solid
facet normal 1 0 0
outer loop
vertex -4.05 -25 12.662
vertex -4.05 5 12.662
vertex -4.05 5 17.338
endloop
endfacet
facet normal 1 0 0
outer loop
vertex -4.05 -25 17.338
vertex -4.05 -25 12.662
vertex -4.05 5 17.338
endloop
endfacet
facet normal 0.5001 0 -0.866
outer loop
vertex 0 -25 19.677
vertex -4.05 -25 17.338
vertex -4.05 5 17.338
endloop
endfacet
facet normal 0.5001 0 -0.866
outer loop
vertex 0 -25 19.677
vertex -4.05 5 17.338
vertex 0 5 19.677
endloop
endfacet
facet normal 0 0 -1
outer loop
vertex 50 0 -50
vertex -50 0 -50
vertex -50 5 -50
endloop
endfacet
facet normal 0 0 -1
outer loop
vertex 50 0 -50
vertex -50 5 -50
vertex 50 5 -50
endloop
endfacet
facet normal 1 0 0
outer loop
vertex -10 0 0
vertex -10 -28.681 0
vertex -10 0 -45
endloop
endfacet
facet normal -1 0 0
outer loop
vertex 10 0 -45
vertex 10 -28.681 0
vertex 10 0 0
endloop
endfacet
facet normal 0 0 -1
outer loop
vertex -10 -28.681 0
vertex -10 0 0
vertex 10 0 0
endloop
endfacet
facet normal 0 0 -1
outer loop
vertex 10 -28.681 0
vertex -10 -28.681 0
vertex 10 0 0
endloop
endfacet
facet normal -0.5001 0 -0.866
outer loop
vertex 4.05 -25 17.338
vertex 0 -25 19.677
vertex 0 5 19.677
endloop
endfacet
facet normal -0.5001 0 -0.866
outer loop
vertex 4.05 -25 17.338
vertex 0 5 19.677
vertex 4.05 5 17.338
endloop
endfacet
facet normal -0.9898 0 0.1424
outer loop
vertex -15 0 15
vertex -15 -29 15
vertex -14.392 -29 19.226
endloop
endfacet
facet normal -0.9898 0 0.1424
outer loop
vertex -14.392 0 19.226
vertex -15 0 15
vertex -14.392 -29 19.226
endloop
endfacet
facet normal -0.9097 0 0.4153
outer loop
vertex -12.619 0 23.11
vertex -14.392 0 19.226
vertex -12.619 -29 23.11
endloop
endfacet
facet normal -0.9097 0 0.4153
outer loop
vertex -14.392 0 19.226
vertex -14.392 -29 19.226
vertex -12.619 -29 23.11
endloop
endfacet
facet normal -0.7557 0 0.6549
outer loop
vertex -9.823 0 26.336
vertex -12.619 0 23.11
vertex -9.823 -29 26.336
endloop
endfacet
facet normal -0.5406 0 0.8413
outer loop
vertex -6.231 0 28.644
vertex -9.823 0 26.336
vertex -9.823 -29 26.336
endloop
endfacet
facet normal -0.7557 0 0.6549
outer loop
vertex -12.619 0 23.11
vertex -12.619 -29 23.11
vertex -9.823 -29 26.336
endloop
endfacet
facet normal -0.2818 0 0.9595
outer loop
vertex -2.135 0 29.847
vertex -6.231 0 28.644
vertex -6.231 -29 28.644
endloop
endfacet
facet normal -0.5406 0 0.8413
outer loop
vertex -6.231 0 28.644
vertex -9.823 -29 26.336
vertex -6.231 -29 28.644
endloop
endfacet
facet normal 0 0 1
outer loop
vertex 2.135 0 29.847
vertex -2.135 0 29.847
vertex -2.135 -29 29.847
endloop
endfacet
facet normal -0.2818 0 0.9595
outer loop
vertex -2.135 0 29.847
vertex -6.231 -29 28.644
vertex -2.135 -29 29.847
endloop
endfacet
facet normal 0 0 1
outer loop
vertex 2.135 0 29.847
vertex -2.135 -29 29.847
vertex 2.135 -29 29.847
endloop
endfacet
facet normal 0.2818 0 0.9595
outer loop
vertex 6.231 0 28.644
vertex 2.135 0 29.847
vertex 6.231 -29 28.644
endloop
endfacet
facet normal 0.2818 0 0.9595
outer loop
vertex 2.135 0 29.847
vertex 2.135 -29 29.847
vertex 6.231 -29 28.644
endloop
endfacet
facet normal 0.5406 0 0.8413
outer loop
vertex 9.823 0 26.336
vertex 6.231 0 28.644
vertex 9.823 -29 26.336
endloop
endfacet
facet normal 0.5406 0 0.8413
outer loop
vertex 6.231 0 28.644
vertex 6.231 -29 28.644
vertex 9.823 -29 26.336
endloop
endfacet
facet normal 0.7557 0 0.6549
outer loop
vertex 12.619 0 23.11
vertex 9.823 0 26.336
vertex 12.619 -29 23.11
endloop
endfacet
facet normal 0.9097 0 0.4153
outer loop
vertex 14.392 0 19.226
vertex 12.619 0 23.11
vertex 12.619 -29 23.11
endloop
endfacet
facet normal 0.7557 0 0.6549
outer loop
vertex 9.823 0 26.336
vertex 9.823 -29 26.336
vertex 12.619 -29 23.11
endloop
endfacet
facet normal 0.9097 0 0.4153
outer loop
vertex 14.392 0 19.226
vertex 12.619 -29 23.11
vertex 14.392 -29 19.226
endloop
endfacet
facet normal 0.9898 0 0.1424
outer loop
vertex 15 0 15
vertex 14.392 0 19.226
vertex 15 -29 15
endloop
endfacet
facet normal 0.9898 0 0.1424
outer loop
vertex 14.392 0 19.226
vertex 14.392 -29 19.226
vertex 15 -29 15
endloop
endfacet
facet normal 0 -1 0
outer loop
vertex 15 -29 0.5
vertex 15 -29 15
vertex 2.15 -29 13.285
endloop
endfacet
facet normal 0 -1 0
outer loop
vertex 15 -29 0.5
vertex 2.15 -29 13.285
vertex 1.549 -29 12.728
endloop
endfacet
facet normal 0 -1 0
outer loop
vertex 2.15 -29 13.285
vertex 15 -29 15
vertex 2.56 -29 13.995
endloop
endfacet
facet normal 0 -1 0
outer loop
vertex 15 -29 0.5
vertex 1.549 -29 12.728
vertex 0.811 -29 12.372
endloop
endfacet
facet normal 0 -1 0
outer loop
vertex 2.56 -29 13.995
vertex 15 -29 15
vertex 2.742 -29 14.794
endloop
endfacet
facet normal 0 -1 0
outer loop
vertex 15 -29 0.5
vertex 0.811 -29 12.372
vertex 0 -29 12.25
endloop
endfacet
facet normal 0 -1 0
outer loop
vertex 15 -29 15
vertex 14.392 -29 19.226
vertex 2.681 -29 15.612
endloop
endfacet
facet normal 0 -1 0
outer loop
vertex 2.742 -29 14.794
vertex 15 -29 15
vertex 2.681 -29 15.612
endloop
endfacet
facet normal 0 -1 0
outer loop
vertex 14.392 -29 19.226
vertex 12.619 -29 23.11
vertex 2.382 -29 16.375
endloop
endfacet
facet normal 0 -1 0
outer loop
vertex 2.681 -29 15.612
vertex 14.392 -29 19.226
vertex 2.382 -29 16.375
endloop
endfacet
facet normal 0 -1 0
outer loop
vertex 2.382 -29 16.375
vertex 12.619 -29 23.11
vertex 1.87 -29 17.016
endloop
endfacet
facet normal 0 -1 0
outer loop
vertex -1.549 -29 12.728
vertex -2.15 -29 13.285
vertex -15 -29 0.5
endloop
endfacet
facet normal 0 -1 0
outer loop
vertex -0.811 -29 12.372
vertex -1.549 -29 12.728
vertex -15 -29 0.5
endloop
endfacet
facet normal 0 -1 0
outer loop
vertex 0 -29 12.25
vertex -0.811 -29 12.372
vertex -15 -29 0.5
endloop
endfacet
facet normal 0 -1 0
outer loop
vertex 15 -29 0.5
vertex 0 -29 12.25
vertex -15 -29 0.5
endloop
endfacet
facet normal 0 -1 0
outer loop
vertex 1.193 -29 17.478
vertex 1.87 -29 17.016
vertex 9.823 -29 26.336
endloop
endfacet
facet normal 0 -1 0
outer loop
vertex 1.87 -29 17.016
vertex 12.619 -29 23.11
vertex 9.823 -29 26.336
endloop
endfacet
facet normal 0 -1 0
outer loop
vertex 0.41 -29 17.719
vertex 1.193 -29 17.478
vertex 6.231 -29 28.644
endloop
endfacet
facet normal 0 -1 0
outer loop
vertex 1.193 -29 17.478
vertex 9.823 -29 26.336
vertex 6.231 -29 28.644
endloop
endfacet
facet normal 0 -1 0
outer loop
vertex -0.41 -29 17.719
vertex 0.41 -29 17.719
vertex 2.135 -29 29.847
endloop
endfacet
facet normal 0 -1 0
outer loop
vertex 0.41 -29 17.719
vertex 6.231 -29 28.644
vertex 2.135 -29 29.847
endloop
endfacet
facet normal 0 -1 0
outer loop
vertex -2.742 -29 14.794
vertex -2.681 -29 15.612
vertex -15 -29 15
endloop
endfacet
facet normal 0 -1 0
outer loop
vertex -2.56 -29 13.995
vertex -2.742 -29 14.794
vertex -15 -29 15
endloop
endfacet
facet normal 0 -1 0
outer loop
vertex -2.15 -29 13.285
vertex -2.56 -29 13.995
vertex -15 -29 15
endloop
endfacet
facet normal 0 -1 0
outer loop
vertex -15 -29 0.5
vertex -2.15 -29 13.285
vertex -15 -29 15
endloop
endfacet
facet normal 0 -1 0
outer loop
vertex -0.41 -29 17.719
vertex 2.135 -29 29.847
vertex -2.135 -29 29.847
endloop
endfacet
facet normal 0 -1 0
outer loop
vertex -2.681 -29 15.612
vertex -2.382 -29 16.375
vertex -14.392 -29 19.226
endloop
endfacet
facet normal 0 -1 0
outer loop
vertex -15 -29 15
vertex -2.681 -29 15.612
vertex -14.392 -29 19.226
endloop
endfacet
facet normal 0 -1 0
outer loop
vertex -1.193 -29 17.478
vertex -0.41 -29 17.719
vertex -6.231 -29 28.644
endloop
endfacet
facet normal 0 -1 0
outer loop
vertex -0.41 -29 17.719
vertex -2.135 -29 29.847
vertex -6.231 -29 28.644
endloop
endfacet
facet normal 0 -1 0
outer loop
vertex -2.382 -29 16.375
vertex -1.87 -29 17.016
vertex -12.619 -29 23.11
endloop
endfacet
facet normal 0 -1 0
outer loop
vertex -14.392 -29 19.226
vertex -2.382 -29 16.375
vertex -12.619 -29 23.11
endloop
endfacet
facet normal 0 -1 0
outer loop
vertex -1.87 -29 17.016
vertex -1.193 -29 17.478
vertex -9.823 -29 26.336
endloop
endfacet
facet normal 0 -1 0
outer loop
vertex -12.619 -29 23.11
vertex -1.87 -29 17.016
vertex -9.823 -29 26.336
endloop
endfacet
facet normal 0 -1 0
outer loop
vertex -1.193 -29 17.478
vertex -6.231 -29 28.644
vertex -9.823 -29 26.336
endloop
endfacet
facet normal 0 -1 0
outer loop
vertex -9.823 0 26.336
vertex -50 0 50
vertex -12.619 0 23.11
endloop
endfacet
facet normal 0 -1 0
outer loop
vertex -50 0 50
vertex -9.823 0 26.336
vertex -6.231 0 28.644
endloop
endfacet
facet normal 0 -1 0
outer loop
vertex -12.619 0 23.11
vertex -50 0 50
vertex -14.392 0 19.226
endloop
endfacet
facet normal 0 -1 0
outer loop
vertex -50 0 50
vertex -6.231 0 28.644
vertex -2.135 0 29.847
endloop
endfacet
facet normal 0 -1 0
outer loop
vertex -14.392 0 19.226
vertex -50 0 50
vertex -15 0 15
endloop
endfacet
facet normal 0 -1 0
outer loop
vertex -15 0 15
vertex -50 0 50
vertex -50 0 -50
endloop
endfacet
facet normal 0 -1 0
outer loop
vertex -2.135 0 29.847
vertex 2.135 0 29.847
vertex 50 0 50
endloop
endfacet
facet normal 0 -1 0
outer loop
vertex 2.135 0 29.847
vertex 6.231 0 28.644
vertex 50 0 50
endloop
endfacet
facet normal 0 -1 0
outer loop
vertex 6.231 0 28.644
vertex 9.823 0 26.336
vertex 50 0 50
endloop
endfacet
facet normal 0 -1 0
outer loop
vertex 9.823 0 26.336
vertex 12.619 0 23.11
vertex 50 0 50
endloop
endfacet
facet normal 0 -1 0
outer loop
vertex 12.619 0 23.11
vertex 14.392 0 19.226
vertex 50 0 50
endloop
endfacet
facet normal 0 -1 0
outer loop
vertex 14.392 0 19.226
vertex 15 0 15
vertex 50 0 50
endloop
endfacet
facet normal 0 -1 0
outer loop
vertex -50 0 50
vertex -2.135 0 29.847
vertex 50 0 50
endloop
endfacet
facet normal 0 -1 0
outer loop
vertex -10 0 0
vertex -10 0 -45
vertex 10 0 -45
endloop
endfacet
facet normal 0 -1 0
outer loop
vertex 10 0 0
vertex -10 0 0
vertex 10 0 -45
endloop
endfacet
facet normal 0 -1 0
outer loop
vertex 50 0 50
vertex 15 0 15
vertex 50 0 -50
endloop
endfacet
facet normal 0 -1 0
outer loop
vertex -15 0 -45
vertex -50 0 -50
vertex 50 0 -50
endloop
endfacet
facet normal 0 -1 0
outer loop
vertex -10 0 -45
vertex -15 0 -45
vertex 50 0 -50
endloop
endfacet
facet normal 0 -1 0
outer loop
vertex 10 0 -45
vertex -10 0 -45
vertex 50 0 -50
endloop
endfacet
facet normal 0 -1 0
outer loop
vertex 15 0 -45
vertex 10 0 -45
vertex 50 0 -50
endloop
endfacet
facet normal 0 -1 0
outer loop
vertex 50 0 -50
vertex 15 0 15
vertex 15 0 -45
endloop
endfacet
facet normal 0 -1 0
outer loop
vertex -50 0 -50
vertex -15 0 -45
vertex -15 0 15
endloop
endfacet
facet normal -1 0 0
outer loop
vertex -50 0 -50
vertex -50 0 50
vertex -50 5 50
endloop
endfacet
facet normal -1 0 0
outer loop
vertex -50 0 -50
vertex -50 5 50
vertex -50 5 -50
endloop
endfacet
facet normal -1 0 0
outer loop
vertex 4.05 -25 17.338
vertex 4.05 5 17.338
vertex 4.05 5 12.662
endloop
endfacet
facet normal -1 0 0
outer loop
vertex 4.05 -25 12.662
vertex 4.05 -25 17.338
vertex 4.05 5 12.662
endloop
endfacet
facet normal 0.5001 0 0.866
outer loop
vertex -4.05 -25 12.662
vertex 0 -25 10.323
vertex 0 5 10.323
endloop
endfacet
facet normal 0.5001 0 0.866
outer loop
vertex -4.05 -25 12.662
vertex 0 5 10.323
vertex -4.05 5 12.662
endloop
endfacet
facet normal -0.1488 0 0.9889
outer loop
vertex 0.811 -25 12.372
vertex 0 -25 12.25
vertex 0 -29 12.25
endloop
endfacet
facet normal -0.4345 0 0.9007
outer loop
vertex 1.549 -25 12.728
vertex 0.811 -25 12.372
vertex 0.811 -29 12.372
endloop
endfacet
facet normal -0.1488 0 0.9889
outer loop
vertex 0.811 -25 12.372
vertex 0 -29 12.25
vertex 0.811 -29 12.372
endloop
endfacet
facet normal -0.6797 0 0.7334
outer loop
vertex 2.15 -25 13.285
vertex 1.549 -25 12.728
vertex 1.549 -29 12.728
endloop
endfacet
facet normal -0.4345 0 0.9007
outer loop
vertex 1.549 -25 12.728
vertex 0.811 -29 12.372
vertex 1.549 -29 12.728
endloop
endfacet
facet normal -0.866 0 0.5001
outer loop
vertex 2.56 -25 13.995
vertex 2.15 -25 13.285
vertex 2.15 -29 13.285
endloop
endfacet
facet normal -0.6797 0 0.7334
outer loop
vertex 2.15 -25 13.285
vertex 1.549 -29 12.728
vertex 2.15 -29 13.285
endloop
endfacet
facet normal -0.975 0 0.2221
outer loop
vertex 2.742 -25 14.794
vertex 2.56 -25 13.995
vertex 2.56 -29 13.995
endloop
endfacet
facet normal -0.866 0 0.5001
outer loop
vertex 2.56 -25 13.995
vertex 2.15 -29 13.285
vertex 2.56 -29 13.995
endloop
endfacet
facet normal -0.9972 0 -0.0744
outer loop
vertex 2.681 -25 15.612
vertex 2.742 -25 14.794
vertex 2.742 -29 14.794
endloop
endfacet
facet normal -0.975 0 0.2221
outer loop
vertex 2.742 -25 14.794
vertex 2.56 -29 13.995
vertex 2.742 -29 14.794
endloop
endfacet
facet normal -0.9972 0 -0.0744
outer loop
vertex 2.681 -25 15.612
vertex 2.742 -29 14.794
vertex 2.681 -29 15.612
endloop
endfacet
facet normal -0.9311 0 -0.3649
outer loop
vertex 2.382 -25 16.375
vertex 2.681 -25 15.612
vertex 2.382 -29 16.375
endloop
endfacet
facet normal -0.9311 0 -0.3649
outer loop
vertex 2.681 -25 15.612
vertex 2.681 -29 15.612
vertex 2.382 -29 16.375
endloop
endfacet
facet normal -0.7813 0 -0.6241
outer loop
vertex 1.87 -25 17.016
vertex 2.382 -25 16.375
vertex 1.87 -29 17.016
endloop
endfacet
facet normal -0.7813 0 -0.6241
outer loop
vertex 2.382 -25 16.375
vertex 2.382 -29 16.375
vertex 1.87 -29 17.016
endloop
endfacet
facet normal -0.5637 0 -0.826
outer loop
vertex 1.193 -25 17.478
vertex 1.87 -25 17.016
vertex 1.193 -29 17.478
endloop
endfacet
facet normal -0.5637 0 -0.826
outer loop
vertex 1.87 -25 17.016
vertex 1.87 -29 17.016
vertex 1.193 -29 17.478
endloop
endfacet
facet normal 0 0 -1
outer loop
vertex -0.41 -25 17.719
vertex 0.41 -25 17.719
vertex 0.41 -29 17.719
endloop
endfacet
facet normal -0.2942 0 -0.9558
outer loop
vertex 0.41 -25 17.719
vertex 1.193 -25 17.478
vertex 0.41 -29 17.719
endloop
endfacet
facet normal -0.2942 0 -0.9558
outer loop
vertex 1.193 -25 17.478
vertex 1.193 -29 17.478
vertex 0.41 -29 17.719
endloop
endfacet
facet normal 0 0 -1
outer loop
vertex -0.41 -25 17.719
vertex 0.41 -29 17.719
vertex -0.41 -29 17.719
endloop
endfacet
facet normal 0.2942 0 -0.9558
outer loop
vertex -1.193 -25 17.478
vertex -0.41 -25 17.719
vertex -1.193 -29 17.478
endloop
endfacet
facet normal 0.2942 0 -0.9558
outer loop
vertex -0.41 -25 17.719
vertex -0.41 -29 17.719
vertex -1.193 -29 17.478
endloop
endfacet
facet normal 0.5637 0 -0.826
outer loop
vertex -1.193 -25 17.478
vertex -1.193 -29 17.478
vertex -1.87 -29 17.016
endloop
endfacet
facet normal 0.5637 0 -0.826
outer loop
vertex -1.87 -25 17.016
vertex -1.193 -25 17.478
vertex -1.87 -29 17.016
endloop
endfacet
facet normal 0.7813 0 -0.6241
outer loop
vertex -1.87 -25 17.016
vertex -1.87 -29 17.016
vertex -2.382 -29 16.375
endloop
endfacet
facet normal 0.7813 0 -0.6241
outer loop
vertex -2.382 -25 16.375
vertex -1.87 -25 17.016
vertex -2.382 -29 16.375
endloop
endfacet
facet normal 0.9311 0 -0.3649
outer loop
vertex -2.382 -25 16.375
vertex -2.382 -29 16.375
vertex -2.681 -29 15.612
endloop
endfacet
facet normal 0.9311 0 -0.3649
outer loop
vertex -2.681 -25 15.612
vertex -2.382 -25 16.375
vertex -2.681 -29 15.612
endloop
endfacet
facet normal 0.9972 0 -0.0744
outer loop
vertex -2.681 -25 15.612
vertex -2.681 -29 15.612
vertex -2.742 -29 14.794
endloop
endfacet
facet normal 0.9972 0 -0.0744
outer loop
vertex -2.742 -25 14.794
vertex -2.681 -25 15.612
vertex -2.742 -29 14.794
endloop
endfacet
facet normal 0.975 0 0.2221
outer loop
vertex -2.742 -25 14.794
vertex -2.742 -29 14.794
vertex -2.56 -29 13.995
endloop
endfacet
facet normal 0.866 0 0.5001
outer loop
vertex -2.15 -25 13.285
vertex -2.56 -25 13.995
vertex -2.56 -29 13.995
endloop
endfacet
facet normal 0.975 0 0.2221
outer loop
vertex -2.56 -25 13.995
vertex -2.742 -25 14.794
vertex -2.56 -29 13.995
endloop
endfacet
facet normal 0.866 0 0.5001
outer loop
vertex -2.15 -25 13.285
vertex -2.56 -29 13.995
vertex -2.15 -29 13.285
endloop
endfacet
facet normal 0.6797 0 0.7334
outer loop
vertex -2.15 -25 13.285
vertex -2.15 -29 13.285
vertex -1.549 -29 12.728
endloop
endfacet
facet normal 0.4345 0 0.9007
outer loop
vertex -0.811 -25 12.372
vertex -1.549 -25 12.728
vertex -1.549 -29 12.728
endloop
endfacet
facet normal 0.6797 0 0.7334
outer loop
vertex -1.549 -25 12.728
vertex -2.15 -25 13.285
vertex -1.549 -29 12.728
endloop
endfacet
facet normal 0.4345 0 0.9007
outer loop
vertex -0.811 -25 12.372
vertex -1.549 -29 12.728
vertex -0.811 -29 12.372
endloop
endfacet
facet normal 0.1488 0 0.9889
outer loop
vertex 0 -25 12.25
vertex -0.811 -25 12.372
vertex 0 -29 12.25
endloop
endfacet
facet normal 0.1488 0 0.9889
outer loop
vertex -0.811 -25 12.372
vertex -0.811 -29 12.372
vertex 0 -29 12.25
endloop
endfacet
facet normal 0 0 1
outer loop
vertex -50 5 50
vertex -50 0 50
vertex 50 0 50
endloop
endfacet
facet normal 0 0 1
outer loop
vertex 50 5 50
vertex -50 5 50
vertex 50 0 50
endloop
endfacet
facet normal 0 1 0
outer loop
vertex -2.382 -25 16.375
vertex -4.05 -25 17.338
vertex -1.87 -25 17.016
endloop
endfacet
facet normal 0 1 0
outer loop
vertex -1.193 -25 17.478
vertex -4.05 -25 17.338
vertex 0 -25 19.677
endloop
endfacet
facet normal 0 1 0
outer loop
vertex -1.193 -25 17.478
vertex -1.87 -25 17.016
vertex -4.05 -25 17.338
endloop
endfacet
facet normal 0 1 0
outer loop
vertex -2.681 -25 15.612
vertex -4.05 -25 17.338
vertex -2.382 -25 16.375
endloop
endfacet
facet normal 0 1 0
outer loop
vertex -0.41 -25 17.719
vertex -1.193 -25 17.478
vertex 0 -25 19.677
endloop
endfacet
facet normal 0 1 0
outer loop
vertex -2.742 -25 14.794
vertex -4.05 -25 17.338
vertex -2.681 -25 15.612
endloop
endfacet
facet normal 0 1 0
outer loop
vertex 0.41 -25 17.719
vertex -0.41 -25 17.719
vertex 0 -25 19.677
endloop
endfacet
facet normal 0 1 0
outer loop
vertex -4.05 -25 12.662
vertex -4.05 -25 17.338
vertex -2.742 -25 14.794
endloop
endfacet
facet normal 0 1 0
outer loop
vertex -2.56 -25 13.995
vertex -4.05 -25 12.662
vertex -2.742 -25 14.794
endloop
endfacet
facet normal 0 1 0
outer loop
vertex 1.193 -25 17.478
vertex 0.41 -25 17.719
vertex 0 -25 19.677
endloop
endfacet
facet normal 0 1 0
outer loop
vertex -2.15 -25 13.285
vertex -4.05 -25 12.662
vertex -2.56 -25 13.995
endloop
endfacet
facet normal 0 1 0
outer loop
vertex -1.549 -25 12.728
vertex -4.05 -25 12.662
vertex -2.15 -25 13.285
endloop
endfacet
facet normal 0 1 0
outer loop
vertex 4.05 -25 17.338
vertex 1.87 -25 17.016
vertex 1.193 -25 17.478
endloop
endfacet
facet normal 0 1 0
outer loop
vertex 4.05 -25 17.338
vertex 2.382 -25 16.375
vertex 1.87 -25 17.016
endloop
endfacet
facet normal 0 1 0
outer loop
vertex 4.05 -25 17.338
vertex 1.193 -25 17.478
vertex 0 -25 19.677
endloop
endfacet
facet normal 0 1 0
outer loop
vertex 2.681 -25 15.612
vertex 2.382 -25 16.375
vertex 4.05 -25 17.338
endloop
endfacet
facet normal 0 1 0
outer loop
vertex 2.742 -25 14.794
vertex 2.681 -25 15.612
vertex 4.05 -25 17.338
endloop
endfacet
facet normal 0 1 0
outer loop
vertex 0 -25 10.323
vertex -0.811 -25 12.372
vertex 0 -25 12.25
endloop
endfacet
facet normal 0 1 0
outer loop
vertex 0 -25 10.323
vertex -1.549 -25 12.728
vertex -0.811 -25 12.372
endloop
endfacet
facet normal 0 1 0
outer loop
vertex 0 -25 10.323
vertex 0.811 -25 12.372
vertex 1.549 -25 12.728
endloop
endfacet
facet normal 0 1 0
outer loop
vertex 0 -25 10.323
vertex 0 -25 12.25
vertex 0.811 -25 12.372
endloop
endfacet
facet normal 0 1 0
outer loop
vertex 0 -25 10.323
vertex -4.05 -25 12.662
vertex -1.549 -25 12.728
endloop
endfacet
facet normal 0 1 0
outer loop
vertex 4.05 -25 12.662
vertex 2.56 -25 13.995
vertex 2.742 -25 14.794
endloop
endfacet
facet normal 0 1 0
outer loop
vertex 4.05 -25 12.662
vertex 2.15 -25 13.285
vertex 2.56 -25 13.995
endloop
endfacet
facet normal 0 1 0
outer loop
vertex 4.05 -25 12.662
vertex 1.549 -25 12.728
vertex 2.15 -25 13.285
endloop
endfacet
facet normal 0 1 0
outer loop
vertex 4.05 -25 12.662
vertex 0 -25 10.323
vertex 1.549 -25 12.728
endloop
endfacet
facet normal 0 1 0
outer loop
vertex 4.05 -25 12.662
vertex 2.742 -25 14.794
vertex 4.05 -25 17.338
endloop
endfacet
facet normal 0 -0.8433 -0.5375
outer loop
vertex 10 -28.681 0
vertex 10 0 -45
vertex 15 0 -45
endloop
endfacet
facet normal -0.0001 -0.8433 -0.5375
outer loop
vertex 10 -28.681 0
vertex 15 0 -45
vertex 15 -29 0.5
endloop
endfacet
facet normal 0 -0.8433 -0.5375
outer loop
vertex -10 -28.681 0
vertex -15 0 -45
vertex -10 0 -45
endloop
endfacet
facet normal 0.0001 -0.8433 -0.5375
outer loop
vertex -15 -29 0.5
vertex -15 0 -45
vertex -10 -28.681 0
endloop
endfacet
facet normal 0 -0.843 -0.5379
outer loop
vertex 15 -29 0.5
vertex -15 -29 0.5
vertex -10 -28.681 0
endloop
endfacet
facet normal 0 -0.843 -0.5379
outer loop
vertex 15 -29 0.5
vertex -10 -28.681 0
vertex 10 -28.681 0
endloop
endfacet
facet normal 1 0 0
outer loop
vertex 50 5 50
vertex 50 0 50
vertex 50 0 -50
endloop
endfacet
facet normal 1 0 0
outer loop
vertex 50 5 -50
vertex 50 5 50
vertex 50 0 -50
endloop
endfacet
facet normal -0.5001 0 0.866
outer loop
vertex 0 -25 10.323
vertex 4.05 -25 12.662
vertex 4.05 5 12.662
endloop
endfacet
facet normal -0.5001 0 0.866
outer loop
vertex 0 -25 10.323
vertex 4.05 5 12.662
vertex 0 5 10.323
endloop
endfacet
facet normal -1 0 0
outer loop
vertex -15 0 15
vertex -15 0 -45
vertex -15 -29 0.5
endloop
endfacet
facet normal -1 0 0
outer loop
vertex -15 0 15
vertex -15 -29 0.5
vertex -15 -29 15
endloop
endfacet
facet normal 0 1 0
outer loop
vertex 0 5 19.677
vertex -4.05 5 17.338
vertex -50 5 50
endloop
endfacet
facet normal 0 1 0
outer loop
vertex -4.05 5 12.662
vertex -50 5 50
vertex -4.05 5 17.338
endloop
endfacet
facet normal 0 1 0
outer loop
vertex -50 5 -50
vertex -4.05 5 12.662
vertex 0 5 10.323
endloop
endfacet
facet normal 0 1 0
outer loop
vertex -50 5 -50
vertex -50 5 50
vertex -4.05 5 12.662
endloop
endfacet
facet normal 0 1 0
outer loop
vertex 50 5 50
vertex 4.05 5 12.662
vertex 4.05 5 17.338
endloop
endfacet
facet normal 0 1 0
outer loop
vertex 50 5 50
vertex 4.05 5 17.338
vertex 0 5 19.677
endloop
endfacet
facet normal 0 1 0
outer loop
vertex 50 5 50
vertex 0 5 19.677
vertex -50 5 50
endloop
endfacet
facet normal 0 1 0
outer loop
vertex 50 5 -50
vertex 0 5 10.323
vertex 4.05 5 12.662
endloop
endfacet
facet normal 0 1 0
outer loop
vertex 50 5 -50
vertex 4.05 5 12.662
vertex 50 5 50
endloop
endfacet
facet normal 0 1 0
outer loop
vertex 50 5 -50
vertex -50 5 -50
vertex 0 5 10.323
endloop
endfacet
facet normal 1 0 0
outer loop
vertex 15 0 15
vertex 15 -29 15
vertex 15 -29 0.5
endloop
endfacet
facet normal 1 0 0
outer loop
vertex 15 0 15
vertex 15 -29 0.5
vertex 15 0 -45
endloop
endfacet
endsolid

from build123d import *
from build123d.topology import SkipClean

# Parameters (mm, degrees)
ESQUISSE1_W             = 100
ESQUISSE1_H             = 100
ESQUISSE1_R             = 2.75
BOSS_EXTRU_1_DEPTH      = 5
BOSS_EXTRU_2_START      = 29
ESQUISSE2_R             = 2.75
BOSS_EXTRU_2_DEPTH      = 29
ESQUISSE3_W             = 30
ESQUISSE3_H             = 43.5
BOSS_EXTRU_3_DEPTH      = 29
CHANFREIN1_SIZE         = 29
CHANFREIN1_SIZE_2       = 45.5
ENL_V_START             = -30
ESQUISSE4_R             = 2.75
ENL_V_MAT_EXTRU_1_DEPTH = 30
ESQUISSE7_W             = 10
ESQUISSE7_H             = 29
ENL_V_MAT_EXTRU_2_DEPTH = 77.426435217


with BuildPart() as part:
    # Esquisse1 → Boss.-Extru.1 (new body)
    with BuildSketch(Plane(origin=(0, 0, 0), x_dir=(1, 0, 0), z_dir=(0, 1, 0))):
        Rectangle(ESQUISSE1_W, ESQUISSE1_H)
        with Locations(Location((0, -15, 0), (0, 0, 270))):
            Circle(ESQUISSE1_R, mode=Mode.SUBTRACT)
    extrude(amount=BOSS_EXTRU_1_DEPTH)

    # Esquisse2 → Boss.-Extru.2 (add)
    with SkipClean():  # the faces are left unmerged after this step: merging them gives an invalid solid
        with BuildSketch(Plane.XZ.offset(BOSS_EXTRU_2_START)):
            with BuildLine():
                ThreePointArc((-15, 15), (0, 30), (15, 15))
                Line((15, 15), (15, -1.5))
                Line((15, -1.5), (-15, -1.5))
                Line((-15, -1.5), (-15, 15))
            make_face()
            with Locations(Location((0, 15, 0), (0, 0, 270))):
                Circle(ESQUISSE2_R, mode=Mode.SUBTRACT)
        extrude(amount=-BOSS_EXTRU_2_DEPTH)

    # Esquisse3 → Boss.-Extru.3 (add)
    with SkipClean():  # the faces are left unmerged after this step: merging them gives an invalid solid
        with BuildSketch(Plane.XZ):
            with Locations((0, -23.25)):
                Rectangle(ESQUISSE3_W, ESQUISSE3_H)
        extrude(amount=BOSS_EXTRU_3_DEPTH)

    # Chanfrein1
    # the kernel refuses this chamfer: 45.5, 29 mm, written as the material it takes off along each edge
    with BuildSketch(Plane(origin=(-132.612350115, -29, -45), x_dir=(0, 0.9986920470194074, -0.051129201247289646), z_dir=(1, 0, 0))) as chanfrein1_piece_1_section:
        Polygon((CHANFREIN1_SIZE * 0.998692047019, CHANFREIN1_SIZE * 0.0511292012473), (-CHANFREIN1_SIZE_2 * 0.0511292012473, CHANFREIN1_SIZE_2 * 0.998692047019), (0, 0), align=None)
    chanfrein1_piece_1 = extrude(amount=265.22470023, mode=Mode.PRIVATE)
    chanfrein1_piece_1 = split(chanfrein1_piece_1, bisect_by=Plane(origin=(0, 0, -29.75832693), z_dir=(0, -1, 0)), keep=Keep.TOP, mode=Mode.PRIVATE)
    add(chanfrein1_piece_1, mode=Mode.SUBTRACT)

    # Esquisse4 → Enlèv. mat.-Extru.1 (cut)
    with BuildSketch(Plane(origin=(0, 5, 0), x_dir=(1, 0, 0), z_dir=(0, 1, 0)).offset(ENL_V_START)):
        Polygon((4.05, -17.33826859), (4.05, -12.66173141), (0, -10.32346282), (-4.05, -12.66173141), (-4.05, -17.33826859), (0, -19.67653718), align=None)
        with Locations(Location((0, -15, 0), (0, 0, 90))):
            Circle(ESQUISSE4_R, mode=Mode.SUBTRACT)
    extrude(amount=ENL_V_MAT_EXTRU_1_DEPTH, mode=Mode.SUBTRACT)

    # Esquisse7 → Enlèv. mat.-Extru.2 (cut, through all)
    with BuildSketch(Plane.XY):
        with Locations((-5, -14.5)):
            Rectangle(ESQUISSE7_W, ESQUISSE7_H)
        with Locations((5, -14.5)):
            Rectangle(ESQUISSE7_W, ESQUISSE7_H)
    extrude(amount=-ENL_V_MAT_EXTRU_2_DEPTH, mode=Mode.SUBTRACT)


solid = part.part
